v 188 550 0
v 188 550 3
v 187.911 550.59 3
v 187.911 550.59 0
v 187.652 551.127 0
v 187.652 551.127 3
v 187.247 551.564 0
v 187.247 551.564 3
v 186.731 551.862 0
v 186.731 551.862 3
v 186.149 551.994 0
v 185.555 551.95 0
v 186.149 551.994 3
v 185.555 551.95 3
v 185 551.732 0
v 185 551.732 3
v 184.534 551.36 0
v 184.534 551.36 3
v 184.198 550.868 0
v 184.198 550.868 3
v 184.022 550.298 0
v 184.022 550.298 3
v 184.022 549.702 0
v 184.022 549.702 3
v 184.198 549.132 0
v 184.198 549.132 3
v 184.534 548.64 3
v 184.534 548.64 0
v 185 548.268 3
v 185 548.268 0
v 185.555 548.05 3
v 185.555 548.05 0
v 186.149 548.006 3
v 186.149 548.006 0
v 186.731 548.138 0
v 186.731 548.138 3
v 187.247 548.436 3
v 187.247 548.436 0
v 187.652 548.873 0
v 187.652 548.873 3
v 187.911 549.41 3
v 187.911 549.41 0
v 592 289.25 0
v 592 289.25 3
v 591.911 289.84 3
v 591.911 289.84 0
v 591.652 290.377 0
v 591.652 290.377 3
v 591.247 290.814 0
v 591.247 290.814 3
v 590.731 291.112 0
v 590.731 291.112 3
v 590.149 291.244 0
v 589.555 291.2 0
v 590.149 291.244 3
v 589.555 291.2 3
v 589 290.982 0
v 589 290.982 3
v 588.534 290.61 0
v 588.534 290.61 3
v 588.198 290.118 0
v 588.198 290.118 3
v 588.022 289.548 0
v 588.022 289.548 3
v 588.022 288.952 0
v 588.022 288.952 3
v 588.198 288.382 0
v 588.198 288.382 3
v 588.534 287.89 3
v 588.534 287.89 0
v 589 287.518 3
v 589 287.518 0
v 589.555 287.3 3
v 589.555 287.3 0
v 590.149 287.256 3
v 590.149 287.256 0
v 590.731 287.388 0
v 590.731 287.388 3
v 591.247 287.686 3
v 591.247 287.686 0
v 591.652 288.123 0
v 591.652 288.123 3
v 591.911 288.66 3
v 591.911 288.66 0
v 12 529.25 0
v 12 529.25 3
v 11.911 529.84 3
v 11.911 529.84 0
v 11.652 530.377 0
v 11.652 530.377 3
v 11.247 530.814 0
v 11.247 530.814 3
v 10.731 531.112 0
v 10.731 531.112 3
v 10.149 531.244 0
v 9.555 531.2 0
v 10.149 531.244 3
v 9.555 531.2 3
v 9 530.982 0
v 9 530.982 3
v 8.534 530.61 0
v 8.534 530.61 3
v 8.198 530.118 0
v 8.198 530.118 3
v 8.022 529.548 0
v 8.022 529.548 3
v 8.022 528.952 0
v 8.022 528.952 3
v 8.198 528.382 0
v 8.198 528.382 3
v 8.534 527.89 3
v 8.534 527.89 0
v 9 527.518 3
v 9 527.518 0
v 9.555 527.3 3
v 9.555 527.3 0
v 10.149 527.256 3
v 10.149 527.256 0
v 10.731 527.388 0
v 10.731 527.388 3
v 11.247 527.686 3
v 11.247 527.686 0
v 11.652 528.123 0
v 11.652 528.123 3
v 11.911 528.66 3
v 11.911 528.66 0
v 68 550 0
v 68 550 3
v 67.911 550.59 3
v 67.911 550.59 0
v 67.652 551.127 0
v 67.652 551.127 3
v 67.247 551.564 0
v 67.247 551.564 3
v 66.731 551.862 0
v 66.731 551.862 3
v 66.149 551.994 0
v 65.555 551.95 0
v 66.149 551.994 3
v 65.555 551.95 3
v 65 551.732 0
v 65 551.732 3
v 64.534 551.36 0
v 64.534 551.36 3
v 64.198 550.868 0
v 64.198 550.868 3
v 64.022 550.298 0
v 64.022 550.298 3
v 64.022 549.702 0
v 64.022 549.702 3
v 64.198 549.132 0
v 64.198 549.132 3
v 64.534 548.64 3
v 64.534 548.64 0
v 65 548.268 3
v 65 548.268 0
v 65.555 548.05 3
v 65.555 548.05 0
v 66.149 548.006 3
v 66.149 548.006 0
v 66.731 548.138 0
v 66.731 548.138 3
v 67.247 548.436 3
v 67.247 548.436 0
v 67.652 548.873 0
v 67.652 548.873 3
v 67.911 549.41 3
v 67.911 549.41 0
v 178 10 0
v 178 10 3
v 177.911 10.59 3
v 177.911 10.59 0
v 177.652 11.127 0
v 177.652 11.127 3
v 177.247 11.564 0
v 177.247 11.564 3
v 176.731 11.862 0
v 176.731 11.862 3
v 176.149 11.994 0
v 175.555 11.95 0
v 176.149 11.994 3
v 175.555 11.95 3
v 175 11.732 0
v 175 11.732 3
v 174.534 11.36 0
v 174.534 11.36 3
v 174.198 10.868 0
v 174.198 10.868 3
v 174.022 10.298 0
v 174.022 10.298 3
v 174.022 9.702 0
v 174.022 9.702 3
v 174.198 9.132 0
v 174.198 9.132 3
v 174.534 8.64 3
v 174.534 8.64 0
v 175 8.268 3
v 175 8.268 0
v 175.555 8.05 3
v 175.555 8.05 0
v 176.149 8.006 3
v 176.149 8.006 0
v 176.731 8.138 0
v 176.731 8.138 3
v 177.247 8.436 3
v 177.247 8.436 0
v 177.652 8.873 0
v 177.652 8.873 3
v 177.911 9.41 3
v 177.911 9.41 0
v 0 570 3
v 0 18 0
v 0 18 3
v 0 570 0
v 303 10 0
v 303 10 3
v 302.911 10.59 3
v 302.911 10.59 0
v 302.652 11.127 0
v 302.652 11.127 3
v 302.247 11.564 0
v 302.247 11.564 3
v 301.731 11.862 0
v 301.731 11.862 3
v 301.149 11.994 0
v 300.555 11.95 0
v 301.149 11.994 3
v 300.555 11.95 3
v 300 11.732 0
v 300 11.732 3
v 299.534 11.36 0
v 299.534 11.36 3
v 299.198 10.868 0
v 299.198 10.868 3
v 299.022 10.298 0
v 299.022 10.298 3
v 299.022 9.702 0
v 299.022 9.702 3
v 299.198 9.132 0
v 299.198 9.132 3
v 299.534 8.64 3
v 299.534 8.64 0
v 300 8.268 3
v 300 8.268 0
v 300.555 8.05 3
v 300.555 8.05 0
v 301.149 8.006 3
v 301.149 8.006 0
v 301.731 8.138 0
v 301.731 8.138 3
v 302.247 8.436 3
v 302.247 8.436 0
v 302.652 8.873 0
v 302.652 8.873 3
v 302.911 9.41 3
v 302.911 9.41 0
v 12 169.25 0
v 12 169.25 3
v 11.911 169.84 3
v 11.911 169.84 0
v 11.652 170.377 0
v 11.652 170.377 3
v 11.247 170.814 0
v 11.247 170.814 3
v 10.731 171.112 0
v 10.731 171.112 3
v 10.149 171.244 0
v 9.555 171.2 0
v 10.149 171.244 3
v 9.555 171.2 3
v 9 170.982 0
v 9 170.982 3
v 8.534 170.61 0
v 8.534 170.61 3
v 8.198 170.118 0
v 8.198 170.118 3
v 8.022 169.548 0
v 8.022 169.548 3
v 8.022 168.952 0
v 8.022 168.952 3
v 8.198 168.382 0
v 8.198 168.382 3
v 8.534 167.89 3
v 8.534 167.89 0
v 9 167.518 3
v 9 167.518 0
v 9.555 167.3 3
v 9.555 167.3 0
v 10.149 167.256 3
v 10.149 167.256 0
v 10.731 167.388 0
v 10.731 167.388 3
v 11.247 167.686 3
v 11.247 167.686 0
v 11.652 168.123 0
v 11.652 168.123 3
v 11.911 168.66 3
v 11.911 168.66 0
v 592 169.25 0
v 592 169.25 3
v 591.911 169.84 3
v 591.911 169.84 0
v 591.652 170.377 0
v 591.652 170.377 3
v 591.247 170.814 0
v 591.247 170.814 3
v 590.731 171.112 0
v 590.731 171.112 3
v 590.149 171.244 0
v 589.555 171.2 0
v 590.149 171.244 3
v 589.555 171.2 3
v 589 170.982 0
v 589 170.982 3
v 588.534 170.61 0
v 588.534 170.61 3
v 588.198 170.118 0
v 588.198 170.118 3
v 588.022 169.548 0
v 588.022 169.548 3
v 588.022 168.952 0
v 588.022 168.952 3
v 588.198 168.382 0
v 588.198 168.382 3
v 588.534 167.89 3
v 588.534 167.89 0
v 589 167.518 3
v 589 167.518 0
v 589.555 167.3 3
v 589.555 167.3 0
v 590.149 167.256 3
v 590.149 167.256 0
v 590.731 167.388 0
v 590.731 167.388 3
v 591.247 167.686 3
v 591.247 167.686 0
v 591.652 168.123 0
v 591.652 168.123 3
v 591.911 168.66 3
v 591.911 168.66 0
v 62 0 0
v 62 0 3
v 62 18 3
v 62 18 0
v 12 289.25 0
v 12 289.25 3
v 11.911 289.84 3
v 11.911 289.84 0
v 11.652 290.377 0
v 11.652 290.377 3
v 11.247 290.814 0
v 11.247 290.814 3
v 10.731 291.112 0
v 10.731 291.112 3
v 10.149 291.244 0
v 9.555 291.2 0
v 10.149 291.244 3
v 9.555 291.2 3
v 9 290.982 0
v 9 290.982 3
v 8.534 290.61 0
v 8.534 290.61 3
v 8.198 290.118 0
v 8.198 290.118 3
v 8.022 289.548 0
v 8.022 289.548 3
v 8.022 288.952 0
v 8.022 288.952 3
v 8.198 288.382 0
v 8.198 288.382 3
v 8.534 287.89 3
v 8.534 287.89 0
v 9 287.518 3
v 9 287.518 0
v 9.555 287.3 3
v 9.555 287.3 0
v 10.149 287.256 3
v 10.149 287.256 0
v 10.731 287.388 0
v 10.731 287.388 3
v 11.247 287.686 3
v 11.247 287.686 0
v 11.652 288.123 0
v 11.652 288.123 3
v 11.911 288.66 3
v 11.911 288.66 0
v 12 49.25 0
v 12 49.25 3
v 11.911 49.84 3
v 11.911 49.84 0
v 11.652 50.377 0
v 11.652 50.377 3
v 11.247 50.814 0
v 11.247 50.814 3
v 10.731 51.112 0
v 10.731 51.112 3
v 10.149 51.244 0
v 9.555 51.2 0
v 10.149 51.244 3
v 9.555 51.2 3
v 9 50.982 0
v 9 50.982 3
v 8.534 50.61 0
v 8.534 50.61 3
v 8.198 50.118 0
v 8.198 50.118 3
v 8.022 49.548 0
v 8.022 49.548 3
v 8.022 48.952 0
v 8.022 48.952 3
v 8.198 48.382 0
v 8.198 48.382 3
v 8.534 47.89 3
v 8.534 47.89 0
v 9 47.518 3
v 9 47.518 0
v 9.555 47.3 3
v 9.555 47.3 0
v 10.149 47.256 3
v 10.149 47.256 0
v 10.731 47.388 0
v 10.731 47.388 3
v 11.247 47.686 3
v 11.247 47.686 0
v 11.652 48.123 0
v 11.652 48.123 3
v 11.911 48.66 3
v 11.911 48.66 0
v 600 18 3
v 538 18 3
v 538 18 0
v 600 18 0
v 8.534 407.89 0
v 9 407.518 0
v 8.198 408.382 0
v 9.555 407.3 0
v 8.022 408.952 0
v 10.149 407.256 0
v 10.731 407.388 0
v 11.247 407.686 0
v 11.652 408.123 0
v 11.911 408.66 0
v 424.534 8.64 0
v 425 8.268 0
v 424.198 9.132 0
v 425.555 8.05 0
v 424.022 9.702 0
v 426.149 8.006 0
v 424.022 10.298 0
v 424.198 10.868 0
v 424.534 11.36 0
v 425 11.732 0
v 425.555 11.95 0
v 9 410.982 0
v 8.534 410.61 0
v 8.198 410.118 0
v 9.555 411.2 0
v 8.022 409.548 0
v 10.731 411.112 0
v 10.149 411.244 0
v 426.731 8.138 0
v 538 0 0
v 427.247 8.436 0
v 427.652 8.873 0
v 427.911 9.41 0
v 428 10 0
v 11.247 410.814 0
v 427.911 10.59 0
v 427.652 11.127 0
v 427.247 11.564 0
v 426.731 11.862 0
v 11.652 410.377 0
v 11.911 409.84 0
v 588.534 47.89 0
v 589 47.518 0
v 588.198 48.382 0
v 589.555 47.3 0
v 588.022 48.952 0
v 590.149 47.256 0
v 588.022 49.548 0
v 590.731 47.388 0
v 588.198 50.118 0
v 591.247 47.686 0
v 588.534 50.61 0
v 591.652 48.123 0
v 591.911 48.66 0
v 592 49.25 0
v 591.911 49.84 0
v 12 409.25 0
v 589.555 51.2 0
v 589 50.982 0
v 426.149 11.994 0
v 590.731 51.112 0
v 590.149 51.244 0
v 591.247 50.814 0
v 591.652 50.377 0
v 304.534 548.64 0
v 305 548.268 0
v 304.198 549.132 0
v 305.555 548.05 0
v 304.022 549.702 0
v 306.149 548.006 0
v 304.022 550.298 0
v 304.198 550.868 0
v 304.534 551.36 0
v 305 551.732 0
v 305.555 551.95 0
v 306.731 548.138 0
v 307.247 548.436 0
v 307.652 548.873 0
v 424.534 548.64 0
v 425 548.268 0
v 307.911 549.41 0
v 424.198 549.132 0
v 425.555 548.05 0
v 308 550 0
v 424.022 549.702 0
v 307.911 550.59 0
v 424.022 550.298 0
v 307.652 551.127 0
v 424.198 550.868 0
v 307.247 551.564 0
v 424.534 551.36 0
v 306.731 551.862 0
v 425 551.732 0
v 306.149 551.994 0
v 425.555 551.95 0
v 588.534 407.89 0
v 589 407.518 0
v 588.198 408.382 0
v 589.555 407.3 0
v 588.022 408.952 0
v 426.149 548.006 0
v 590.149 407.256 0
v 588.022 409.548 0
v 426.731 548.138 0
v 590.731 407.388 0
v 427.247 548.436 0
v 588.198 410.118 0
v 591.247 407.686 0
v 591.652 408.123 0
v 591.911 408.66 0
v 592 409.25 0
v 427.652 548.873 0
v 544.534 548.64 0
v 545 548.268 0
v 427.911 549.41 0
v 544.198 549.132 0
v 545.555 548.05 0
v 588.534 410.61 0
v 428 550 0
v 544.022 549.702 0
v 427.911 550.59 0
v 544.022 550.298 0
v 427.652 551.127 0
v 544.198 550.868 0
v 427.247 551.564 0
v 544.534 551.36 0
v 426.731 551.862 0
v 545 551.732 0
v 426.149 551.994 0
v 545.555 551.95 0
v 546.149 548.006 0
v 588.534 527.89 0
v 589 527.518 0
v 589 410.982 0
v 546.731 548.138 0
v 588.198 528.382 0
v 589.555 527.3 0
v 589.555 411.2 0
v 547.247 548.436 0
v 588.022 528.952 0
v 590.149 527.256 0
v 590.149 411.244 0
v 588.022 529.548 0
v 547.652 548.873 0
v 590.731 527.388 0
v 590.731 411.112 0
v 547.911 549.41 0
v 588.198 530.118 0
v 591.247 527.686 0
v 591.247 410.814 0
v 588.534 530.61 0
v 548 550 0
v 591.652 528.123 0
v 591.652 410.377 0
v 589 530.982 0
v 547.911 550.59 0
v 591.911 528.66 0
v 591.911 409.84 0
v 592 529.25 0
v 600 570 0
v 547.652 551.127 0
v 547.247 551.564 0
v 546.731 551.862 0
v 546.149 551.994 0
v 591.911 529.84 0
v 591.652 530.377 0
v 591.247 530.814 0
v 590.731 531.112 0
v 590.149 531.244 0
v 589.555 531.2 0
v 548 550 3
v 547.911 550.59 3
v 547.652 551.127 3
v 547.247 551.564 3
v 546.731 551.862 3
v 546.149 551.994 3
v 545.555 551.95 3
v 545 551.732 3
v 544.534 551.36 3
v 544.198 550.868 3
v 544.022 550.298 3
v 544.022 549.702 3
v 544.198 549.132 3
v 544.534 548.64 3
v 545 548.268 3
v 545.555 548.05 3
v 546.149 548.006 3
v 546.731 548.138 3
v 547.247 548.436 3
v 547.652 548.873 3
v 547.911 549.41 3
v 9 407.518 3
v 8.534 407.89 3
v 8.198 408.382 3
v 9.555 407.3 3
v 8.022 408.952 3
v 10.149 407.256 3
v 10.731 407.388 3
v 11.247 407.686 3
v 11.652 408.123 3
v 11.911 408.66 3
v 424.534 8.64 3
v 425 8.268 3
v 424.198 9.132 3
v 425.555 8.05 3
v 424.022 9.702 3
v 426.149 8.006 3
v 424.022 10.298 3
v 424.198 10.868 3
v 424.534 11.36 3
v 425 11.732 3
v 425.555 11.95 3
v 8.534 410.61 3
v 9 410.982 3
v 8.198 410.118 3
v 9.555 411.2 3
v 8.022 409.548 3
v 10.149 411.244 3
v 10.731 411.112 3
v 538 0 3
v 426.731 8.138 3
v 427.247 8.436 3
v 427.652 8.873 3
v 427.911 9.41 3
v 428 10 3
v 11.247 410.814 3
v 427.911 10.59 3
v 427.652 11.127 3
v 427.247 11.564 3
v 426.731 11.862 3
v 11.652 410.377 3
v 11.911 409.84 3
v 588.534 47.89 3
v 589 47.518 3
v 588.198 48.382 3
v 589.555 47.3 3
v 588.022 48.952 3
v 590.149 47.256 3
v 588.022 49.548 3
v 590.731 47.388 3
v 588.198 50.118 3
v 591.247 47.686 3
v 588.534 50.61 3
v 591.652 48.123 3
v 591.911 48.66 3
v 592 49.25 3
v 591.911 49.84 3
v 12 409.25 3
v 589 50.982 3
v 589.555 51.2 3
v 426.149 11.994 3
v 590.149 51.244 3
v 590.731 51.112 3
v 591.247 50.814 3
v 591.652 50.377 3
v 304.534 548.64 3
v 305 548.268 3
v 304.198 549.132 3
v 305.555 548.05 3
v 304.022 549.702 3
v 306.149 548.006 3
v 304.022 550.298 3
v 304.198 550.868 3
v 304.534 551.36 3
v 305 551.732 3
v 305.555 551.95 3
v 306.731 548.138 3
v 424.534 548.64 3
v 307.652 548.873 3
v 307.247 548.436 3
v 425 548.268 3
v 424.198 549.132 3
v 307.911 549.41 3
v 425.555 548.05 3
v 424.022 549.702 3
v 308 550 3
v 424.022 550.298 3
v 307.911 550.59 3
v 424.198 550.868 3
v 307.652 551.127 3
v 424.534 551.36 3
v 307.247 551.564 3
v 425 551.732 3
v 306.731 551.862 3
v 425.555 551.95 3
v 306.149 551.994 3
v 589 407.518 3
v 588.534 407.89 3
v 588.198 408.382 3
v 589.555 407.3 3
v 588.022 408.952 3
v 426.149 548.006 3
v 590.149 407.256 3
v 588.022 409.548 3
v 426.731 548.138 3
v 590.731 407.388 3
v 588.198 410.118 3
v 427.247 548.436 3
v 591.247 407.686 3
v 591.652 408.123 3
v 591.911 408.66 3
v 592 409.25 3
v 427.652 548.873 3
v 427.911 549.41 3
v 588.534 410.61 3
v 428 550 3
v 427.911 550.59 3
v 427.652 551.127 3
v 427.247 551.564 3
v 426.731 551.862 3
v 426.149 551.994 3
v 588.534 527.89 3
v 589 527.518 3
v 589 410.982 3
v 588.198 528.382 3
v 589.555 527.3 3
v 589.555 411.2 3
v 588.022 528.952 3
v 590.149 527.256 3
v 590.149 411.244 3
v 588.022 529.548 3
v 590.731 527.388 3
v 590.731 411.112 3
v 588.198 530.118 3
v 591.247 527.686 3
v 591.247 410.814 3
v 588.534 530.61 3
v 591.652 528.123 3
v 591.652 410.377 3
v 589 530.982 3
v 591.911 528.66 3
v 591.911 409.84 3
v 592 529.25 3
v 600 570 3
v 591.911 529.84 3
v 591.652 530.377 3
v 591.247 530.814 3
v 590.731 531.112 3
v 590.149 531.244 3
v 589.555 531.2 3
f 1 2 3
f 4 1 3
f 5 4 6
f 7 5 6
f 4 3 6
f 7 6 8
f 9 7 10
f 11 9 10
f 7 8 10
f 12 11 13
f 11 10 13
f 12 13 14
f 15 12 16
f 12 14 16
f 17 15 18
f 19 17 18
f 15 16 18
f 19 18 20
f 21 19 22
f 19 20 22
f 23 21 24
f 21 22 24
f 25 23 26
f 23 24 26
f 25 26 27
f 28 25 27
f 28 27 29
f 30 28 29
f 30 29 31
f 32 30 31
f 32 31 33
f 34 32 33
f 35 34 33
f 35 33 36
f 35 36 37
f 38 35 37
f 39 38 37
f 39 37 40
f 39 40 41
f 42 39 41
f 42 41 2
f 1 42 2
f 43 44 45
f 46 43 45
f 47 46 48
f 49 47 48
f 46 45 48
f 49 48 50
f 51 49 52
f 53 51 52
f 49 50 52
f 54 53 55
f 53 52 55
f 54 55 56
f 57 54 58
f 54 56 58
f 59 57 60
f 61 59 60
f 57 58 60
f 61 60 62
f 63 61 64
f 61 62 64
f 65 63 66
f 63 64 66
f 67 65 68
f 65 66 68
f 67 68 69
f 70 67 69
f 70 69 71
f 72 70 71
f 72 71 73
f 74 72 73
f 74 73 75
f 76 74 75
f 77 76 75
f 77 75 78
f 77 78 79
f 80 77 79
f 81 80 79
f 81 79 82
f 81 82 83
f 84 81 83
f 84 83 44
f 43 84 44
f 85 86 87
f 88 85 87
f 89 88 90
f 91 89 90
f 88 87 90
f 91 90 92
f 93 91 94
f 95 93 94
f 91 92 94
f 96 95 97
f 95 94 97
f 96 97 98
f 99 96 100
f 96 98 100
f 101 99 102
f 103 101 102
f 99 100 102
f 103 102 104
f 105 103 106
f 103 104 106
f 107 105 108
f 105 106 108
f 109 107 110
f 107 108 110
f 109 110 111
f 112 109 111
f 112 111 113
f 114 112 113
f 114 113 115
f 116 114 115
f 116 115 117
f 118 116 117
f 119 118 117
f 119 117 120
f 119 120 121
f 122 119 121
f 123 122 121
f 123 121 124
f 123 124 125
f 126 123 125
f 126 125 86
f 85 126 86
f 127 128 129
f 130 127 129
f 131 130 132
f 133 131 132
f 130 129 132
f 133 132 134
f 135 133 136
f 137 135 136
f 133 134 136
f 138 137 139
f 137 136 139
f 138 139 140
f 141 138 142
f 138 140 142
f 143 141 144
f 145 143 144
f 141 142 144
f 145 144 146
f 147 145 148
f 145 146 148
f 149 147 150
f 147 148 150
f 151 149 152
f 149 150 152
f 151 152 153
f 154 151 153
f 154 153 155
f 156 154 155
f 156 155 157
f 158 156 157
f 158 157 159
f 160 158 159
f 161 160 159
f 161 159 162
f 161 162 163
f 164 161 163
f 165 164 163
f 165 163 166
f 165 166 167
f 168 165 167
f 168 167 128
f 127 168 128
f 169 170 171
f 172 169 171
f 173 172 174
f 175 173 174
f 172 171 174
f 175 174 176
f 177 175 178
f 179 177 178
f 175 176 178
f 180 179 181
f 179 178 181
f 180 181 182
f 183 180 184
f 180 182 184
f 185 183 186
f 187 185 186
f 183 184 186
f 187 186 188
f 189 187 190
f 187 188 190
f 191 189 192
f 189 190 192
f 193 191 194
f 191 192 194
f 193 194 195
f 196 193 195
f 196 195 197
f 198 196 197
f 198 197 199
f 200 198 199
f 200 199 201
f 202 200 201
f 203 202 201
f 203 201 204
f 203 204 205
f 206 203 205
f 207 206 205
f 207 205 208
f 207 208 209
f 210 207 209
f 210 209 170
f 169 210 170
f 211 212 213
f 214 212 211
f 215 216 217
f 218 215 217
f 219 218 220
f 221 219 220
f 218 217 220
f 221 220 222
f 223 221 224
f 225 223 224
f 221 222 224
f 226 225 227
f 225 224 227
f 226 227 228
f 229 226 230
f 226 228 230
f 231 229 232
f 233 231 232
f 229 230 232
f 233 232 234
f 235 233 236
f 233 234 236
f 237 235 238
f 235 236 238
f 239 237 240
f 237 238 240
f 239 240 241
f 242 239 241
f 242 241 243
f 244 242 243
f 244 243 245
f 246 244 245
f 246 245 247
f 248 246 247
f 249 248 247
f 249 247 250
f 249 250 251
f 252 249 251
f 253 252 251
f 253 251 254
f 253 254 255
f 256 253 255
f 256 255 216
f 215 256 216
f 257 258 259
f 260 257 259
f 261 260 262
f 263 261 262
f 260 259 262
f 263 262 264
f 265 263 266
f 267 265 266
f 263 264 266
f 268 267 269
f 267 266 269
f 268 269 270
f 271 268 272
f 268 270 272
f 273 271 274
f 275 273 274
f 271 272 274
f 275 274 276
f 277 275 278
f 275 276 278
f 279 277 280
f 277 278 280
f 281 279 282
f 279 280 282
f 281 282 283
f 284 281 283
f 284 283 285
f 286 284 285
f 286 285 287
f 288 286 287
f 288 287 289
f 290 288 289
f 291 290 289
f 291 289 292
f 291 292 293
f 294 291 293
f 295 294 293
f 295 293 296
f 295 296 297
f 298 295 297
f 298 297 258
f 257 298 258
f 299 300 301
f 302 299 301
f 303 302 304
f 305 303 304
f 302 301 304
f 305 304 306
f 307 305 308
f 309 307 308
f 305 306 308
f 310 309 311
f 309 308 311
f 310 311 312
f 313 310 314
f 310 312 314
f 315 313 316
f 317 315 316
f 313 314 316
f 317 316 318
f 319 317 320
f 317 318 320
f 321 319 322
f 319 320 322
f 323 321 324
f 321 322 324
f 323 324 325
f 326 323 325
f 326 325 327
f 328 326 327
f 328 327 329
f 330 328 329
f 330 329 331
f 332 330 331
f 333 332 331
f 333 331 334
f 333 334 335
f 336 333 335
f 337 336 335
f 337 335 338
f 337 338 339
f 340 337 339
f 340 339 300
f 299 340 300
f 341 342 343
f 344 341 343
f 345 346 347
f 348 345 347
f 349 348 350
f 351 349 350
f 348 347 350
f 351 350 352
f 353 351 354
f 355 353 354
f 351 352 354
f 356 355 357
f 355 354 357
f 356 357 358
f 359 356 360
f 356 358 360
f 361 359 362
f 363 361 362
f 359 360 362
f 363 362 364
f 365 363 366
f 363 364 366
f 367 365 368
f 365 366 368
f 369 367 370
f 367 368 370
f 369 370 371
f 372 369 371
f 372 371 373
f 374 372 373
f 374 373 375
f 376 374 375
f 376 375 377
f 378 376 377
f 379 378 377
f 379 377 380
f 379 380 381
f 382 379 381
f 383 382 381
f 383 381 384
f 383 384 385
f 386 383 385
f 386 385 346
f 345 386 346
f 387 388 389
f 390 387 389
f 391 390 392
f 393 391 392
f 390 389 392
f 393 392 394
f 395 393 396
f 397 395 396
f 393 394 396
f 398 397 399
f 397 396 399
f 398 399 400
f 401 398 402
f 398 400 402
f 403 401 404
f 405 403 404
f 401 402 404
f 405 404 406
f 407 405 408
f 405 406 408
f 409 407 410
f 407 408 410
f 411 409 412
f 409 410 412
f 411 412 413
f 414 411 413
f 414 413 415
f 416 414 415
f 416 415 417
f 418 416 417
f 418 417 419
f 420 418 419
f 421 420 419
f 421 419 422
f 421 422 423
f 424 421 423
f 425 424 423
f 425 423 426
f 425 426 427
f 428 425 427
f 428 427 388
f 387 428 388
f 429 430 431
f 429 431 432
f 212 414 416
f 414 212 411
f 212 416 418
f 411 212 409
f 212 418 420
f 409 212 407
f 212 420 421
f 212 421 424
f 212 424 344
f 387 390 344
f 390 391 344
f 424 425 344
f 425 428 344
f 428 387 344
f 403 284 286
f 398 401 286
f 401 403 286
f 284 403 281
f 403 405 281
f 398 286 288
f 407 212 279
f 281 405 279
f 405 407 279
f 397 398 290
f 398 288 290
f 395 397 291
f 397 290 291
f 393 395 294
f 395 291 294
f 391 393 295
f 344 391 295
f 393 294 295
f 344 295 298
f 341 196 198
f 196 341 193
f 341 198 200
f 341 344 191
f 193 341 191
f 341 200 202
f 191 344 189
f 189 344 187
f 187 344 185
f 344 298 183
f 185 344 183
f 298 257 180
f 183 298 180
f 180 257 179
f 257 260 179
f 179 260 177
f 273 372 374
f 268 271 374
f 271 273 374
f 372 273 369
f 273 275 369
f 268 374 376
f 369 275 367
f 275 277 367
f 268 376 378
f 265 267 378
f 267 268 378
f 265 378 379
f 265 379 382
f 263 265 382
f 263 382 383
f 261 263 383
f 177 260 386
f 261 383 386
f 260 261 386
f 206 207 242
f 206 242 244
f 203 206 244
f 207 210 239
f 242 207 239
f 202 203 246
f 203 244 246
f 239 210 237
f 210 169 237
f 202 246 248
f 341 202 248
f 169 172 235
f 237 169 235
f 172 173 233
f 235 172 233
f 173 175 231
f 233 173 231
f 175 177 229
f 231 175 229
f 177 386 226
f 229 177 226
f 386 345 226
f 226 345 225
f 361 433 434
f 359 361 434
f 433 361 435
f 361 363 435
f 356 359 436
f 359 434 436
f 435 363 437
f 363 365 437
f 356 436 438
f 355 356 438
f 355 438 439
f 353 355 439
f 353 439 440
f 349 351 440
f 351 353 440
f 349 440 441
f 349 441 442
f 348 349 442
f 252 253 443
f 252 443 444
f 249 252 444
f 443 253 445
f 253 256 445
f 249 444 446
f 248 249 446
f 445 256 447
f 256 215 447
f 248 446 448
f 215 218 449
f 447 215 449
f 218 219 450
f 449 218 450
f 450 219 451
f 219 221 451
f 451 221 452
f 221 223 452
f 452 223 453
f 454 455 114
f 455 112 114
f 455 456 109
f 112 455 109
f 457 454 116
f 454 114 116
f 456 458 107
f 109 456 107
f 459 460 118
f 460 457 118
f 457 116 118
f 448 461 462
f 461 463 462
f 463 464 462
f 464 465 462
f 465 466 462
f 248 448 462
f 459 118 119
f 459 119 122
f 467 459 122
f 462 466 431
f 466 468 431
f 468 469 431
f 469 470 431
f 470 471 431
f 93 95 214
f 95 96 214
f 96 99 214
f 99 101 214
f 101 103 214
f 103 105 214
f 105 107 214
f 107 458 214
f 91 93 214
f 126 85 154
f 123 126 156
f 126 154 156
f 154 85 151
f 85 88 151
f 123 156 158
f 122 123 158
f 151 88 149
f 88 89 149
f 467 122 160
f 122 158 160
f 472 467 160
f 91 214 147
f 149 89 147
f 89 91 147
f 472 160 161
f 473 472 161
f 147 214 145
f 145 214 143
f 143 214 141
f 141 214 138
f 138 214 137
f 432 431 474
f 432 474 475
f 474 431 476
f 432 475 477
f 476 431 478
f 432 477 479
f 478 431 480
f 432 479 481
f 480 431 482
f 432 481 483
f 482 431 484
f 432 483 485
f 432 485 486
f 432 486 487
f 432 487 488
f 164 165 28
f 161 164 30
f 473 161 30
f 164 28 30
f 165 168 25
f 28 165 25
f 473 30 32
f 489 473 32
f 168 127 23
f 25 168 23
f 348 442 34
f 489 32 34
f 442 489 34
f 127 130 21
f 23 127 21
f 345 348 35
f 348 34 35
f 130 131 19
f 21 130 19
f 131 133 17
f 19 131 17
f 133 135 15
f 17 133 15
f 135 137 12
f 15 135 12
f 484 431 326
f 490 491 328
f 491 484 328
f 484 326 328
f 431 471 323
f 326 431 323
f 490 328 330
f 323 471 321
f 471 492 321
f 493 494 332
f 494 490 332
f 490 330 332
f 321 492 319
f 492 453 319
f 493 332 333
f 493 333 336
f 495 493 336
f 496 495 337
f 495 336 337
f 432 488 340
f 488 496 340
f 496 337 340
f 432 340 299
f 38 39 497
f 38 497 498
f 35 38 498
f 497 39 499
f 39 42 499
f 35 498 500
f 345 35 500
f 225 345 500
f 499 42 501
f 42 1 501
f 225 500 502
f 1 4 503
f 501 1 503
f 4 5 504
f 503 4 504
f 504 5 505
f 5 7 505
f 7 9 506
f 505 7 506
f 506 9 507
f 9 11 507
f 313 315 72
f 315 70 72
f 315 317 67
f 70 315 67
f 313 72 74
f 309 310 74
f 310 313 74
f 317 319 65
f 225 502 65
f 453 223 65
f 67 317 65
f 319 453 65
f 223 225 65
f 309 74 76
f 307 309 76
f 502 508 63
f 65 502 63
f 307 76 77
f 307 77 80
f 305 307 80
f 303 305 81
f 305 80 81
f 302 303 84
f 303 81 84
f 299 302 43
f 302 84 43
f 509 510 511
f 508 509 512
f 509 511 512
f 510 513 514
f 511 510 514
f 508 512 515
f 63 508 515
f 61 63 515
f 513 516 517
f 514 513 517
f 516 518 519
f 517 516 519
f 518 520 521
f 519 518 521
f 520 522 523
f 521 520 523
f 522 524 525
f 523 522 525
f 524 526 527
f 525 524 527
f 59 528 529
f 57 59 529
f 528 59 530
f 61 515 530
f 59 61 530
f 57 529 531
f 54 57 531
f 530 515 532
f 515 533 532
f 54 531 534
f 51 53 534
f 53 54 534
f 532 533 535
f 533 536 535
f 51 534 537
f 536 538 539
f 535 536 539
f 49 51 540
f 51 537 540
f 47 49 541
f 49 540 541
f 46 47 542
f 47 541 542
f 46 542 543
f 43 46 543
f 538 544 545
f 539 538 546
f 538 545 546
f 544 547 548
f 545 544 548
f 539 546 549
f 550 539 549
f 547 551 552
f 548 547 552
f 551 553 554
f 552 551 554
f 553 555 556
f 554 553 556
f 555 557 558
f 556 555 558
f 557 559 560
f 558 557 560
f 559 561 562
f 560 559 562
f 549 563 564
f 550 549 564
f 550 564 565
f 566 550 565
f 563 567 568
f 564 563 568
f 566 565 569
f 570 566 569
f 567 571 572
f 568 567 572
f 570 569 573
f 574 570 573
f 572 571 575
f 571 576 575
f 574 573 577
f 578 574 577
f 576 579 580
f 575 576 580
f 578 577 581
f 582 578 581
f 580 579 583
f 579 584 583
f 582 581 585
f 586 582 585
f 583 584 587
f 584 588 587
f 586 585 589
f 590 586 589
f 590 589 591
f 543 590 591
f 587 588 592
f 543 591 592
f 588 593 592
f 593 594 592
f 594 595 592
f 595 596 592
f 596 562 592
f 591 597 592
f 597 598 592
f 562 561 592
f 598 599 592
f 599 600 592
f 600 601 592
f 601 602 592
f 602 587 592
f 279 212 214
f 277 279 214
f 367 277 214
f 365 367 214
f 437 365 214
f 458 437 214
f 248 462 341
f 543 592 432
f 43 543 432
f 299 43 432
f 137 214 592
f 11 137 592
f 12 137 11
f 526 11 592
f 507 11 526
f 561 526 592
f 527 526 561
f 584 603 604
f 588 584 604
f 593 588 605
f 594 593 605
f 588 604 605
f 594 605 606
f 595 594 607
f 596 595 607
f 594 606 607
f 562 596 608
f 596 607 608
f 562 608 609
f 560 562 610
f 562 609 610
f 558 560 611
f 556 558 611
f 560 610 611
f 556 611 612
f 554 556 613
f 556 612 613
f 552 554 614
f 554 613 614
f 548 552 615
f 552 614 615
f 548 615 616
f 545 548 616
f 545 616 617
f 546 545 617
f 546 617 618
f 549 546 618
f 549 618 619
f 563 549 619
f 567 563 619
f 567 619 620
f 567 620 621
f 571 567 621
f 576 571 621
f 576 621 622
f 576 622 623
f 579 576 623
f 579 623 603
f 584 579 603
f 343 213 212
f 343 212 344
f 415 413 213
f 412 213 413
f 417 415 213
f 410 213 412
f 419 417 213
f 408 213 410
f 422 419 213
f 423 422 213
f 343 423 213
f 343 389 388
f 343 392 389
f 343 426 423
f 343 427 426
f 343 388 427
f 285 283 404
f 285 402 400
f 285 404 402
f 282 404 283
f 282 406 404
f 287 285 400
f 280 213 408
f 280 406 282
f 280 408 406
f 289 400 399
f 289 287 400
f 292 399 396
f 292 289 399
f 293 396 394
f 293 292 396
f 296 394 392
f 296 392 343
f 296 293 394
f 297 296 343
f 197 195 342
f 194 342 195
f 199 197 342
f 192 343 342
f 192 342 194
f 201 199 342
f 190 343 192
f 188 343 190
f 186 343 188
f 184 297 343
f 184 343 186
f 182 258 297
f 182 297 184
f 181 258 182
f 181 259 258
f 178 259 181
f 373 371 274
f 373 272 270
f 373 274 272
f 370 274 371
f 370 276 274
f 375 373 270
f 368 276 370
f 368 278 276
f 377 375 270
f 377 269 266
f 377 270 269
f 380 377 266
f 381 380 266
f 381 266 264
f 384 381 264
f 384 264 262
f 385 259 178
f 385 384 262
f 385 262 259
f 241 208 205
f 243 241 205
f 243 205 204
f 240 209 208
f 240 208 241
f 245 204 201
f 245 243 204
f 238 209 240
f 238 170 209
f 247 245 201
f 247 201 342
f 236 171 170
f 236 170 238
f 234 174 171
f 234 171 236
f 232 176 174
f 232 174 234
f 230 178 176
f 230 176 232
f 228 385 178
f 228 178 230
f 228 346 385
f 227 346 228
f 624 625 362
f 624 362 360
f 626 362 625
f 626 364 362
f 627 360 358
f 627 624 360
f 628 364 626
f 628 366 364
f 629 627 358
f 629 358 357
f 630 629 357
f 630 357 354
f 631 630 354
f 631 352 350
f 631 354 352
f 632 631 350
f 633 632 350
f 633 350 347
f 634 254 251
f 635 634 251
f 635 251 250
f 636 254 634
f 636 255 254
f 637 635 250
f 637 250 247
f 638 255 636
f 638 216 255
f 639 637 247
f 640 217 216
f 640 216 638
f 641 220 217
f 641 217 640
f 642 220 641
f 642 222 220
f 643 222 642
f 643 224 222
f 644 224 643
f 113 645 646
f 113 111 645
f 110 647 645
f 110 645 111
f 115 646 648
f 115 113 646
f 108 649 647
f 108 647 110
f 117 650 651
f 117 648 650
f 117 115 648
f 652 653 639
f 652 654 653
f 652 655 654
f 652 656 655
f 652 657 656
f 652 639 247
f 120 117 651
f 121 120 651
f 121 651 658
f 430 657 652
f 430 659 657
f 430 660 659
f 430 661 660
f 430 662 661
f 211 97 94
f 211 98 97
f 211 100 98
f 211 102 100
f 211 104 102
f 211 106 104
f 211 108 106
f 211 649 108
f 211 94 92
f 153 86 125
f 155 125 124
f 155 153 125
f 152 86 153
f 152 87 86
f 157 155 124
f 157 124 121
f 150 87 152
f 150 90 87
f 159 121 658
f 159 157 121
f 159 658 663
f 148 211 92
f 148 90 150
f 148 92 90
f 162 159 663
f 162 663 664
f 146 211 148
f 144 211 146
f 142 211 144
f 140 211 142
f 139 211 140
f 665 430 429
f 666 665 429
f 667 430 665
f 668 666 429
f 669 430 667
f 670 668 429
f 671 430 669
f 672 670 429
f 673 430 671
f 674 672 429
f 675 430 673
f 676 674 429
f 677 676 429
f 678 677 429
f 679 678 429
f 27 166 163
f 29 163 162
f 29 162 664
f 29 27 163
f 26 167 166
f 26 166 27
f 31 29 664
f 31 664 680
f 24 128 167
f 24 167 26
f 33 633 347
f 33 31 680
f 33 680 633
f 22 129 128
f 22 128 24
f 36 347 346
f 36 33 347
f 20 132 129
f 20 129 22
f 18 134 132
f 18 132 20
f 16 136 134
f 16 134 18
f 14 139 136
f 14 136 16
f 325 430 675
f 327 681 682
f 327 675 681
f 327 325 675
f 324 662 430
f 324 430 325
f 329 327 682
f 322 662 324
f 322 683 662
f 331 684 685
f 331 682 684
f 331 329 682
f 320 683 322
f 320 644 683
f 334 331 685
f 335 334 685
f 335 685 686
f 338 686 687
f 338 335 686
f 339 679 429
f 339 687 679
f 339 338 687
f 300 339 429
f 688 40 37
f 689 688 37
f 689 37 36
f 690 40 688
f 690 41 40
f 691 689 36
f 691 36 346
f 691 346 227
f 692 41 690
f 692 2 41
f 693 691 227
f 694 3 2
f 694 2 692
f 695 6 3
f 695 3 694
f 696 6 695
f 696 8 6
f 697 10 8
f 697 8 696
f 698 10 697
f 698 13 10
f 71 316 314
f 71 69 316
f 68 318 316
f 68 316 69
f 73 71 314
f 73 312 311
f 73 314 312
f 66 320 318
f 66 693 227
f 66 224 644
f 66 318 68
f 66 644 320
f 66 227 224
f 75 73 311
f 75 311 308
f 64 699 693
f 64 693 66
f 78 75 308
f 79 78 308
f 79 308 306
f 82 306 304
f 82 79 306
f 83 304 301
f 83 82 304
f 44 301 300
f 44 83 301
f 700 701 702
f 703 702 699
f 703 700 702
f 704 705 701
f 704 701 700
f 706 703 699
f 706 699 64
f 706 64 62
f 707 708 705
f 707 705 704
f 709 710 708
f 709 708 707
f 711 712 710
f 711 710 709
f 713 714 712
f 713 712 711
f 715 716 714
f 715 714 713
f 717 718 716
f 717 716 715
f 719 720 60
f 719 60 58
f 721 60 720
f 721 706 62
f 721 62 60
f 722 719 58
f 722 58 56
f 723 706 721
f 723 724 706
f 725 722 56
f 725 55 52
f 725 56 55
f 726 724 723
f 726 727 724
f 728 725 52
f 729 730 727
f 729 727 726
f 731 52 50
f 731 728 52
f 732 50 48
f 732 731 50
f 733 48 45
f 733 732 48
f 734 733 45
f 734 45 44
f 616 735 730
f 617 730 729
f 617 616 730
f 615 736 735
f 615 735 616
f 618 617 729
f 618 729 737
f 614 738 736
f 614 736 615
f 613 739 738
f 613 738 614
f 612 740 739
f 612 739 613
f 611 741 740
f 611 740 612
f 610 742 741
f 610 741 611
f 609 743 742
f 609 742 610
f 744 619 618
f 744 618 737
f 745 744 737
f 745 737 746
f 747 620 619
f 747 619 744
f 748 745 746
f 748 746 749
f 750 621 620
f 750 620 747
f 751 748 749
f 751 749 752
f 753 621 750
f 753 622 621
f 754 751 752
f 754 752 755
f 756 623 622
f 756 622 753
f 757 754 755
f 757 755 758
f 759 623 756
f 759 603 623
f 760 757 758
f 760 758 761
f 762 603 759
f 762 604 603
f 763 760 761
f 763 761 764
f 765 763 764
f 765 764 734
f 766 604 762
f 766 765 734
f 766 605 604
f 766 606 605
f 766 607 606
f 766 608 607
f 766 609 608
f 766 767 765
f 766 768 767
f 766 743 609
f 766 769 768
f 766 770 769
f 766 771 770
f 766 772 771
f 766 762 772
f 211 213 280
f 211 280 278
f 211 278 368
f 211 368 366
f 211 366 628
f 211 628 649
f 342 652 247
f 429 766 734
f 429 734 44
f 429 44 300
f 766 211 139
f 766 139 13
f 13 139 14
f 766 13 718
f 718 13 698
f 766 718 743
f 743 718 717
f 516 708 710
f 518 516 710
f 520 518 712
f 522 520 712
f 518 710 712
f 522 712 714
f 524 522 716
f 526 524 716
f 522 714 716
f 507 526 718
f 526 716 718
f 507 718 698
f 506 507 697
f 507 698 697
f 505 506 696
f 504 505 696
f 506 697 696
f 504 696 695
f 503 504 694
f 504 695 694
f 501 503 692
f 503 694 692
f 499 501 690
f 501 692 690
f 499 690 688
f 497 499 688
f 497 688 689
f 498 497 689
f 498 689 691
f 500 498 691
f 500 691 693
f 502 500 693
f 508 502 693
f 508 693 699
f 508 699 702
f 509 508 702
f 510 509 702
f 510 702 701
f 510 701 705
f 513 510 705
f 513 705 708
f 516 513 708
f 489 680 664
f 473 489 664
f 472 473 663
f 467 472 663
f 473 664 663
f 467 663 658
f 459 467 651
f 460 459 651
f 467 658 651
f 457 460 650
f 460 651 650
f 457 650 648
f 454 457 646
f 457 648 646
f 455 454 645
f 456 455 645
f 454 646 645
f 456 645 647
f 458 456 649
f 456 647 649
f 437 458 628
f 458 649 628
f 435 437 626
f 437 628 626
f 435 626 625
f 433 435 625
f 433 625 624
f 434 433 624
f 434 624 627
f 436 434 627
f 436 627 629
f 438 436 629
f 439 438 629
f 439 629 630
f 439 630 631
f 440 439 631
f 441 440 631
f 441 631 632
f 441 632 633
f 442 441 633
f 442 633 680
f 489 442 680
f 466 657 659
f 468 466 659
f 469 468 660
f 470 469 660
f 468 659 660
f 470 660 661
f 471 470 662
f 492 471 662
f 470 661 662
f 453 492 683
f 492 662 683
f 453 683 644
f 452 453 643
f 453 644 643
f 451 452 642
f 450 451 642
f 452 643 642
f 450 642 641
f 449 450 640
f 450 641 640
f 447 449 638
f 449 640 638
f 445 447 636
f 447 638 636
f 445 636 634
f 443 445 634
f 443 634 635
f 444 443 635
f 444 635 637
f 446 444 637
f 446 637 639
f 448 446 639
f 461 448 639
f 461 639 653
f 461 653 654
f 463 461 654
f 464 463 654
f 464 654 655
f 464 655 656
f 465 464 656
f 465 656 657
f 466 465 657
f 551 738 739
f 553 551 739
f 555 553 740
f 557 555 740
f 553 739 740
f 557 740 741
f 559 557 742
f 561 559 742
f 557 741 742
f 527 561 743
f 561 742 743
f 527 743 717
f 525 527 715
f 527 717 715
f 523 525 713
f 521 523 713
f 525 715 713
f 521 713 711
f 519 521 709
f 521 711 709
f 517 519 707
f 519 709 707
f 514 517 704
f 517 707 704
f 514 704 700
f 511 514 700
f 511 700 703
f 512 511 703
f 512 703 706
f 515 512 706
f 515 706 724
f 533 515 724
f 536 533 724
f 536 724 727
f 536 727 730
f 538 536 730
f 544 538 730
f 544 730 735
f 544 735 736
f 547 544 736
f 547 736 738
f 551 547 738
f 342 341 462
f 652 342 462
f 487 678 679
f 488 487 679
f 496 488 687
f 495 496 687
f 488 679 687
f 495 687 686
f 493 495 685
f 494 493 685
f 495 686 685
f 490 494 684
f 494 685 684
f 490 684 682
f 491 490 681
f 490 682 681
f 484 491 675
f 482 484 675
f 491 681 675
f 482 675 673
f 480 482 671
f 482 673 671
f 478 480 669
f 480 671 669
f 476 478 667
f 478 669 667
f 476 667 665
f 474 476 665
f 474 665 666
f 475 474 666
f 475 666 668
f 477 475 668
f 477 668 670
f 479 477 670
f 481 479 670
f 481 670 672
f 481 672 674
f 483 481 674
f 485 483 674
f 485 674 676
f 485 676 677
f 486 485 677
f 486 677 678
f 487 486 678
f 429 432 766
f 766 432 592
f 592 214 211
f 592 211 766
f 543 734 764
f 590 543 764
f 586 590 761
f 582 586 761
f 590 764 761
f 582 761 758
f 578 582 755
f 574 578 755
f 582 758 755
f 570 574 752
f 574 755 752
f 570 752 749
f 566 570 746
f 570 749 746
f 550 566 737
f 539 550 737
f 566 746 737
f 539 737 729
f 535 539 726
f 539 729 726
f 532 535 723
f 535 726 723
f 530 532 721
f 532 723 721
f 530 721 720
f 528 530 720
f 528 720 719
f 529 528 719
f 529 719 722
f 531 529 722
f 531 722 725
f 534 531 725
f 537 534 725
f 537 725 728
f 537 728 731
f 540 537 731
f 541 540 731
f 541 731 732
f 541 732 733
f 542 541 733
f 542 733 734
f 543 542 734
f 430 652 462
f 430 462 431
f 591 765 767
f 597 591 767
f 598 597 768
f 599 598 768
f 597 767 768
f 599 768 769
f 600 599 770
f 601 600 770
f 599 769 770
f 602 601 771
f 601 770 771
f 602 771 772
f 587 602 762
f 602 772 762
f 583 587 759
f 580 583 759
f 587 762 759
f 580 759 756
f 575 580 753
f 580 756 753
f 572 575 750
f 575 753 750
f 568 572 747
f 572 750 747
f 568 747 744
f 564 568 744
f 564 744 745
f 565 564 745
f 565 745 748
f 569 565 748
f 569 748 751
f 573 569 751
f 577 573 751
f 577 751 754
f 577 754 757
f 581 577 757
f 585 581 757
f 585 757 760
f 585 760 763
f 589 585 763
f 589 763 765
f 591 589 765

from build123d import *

# Parameters (mm, degrees)
SKETCH1_W             = 600
SKETCH1_H             = 570
BOSS_EXTRUDE1_DEPTH   = 3
SKETCH2_W             = 62
SKETCH2_H             = 18
CUT_EXTRUDE1_DEPTH    = 3
F_4_0MM_DOWEL_HOLE1_D = 4


with BuildPart() as part:
    # Sketch1 → Boss-Extrude1 (new body)
    with BuildSketch(Plane.XY):
        with Locations((300, 285)):
            Rectangle(SKETCH1_W, SKETCH1_H)
    extrude(amount=BOSS_EXTRUDE1_DEPTH)

    # Sketch2 → Cut-Extrude1 (cut)
    with BuildSketch(Plane.XY.offset(3)):
        with Locations((31, 9)):
            Rectangle(SKETCH2_W, SKETCH2_H)
        with Locations((569, 9)):
            Rectangle(SKETCH2_W, SKETCH2_H)
    extrude(amount=-CUT_EXTRUDE1_DEPTH, mode=Mode.SUBTRACT)

    # Ø4.0mm Dowel Hole1 (through all)
    with Locations(Plane(origin=(0, 0, 0), x_dir=(-1, 0, 0), z_dir=(0, 0, -1))):
        with Locations((-546, 550), (-590, 529.25), (-426, 10), (-426, 550), (-306, 550), (-186, 550), (-66, 550), (-10, 529.25), (-10, 409.25), (-10, 289.25), (-10, 169.25), (-10, 49.25), (-590, 409.25), (-590, 289.25), (-590, 169.25), (-590, 49.25), (-301, 10), (-176, 10)):
            Hole(F_4_0MM_DOWEL_HOLE1_D / 2)


solid = part.part
